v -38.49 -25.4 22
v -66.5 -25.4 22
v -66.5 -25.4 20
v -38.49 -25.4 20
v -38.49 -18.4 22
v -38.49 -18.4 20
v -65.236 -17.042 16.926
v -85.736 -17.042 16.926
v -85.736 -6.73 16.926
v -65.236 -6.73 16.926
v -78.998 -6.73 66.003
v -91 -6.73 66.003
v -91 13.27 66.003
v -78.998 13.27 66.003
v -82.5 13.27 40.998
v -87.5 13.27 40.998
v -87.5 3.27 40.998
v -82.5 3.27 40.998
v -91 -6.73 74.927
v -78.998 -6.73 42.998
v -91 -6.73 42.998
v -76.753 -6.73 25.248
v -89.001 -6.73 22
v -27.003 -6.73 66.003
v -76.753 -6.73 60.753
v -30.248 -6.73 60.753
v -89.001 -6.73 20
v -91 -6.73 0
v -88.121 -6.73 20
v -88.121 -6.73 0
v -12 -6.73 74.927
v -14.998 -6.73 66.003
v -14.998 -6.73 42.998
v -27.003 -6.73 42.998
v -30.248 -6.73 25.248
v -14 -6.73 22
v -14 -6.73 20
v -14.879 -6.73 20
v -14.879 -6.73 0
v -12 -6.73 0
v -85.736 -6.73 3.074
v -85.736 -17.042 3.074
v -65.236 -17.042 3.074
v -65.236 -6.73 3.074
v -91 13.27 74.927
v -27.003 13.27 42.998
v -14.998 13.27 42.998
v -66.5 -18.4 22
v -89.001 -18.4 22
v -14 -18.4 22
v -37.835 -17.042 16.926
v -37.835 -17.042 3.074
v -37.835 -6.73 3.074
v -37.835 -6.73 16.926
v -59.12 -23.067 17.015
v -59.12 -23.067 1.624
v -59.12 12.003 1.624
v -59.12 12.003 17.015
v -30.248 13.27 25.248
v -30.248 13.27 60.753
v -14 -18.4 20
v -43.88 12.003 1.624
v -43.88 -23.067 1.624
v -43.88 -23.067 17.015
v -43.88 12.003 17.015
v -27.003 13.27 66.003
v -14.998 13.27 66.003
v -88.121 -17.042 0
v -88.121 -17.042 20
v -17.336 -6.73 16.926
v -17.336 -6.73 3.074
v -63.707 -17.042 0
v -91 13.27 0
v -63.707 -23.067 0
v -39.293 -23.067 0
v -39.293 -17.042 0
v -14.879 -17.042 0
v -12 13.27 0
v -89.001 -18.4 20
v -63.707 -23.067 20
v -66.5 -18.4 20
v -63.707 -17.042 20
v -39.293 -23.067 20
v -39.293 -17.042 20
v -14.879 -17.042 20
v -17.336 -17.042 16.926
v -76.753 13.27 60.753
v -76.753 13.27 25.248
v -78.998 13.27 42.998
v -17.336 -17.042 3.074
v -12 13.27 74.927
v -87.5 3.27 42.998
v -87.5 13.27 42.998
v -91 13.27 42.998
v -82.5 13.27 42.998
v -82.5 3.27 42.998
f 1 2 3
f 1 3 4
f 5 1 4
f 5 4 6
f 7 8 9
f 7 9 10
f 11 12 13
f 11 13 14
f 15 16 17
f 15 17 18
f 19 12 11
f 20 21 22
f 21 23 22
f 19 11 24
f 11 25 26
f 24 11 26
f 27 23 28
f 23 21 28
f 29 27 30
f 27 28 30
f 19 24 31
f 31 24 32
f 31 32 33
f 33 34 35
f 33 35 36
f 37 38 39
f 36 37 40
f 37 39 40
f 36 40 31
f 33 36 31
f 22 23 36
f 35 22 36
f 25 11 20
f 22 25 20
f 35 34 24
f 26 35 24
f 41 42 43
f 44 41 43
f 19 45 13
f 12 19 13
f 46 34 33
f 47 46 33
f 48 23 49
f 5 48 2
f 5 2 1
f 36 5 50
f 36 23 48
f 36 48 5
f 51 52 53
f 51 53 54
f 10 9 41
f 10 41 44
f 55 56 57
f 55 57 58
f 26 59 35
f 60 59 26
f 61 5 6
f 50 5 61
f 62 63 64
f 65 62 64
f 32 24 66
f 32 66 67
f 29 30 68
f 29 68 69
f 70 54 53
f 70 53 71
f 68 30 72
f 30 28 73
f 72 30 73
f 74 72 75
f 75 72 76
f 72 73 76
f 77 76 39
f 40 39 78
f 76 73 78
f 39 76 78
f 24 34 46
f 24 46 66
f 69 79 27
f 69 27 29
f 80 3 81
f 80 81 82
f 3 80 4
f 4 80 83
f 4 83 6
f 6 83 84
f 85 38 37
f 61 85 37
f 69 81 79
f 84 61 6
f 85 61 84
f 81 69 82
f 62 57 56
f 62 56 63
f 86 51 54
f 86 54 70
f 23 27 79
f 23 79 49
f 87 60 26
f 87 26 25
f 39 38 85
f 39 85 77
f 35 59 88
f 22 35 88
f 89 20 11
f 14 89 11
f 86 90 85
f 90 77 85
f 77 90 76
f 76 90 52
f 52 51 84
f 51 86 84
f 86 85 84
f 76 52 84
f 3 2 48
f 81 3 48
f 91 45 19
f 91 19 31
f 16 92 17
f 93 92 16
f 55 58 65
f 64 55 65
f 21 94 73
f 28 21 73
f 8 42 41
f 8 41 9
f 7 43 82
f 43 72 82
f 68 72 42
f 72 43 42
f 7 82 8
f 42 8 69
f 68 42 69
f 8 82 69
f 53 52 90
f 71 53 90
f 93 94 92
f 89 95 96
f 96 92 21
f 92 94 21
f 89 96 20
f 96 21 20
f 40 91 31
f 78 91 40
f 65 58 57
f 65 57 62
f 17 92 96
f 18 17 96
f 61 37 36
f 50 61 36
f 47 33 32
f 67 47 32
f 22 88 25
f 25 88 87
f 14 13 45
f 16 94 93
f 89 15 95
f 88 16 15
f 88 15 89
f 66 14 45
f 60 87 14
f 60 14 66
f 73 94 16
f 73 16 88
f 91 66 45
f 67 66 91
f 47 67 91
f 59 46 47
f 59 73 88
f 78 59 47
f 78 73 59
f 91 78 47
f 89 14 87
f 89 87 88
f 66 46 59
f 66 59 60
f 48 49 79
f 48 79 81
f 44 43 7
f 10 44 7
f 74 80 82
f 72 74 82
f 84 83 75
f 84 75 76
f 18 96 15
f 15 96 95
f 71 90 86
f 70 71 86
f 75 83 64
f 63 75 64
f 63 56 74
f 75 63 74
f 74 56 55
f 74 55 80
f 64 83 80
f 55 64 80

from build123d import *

# Parameters (mm, degrees)
CROQUIS1_W              = 78.999998048
CROQUIS1_H              = 74.927002192
SALIENTE_EXTRUIR1_DEPTH = 20.000000019
SALIENTE_EXTRUIR2_DEPTH = 10.311999824
CROQUIS3_W              = 75.000999496
CROQUIS3_H              = 2.000000328
SALIENTE_EXTRUIR3_DEPTH = 8.357999846
CROQUIS4_W              = 24.49000068
CROQUIS4_H              = 6.999999285
CORTAR_EXTRUIR1_DEPTH   = 22.999999881
CROQUIS5_W              = 22.500999272
CROQUIS5_H              = 6.999999285
CORTAR_EXTRUIR2_DEPTH   = 22.999999881
CROQUIS6_W              = 12.001998722
CROQUIS6_H              = 23.004993797
CORTAR_EXTRUIR3_DEPTH   = 21.000000019
CROQUIS7_W              = 24.414002895
CROQUIS7_H              = 6.024999544
SALIENTE_EXTRUIR4_DEPTH = 19.999999553
CROQUIS8_W              = 46.50499858
CROQUIS8_H              = 35.505000502
CORTAR_EXTRUIR4_DEPTH   = 39.669999689
CROQUIS9_W              = 12.004999444
CROQUIS9_H              = 23.004993797
CORTAR_EXTRUIR5_DEPTH   = 21.000000019
CROQUIS10_W             = 15.239998699
CROQUIS10_H             = 15.390999034
CORTAR_EXTRUIR6_DEPTH   = 35.069999285
CROQUIS11_W             = 20.498998463
CROQUIS11_H             = 13.852000004
CORTAR_EXTRUIR7_DEPTH   = 10.311999824
CROQUIS12_W             = 20.499996841
CROQUIS12_H             = 13.852000004
CORTAR_EXTRUIR8_DEPTH   = 10.311999824
CROQUIS13_W             = 5
CROQUIS13_H             = 10
CORTAR_EXTRUIR9_DEPTH   = 2


with BuildPart() as part:
    # Croquis1 → Saliente-Extruir1 (new body)
    with BuildSketch(Plane(origin=(0, 13.269999996, 0), x_dir=(1, 0, 0), z_dir=(0, 1, 0))):
        with Locations((-51.499999128, -37.463501096)):
            Rectangle(CROQUIS1_W, CROQUIS1_H)
    extrude(amount=-SALIENTE_EXTRUIR1_DEPTH)

    # Croquis2 → Saliente-Extruir2 (add)
    with BuildSketch(Plane.XZ.offset(6.730000023)):
        Polygon((-14.878999442, 0), (-88.121004403, 0), (-88.121004403, 19.999999553), (-89.000999928, 19.999999553), (-89.000999928, 21.999999881), (-14.000000432, 21.999999881), (-14.000000432, 19.999999553), (-14.878999442, 19.999999553), align=None)
    extrude(amount=SALIENTE_EXTRUIR2_DEPTH)

    # Croquis3 → Saliente-Extruir3 (add)
    with BuildSketch(Plane.XZ.offset(17.041999847)):
        with Locations((-51.50050018, 20.999999717)):
            Rectangle(CROQUIS3_W, CROQUIS3_H)
    extrude(amount=SALIENTE_EXTRUIR3_DEPTH)

    # Croquis4 → Cortar-Extruir1 (cut, through all)
    with BuildSketch(Plane.XY.offset(21.999999881)):
        with Locations((-26.245000772, -21.900000051)):
            Rectangle(CROQUIS4_W, CROQUIS4_H)
    extrude(amount=-CORTAR_EXTRUIR1_DEPTH, mode=Mode.SUBTRACT)

    # Croquis5 → Cortar-Extruir2 (cut, through all)
    with BuildSketch(Plane.XY.offset(21.999999881)):
        with Locations((-77.750500292, -21.900000051)):
            Rectangle(CROQUIS5_W, CROQUIS5_H)
    extrude(amount=-CORTAR_EXTRUIR2_DEPTH, mode=Mode.SUBTRACT)

    # Croquis6 → Cortar-Extruir3 (cut, through all)
    with BuildSketch(Plane.XZ.offset(6.730000023)):
        with Locations((-84.998998791, 54.500497878)):
            Rectangle(CROQUIS6_W, CROQUIS6_H)
    extrude(amount=-CORTAR_EXTRUIR3_DEPTH, mode=Mode.SUBTRACT)

    # Croquis7 → Saliente-Extruir4 (add)
    with BuildSketch(Plane(origin=(0, 0, 19.999999553), x_dir=(-1, 0, 0), z_dir=(0, 0, -1))):
        with Locations((51.50000006, -20.054499619)):
            Rectangle(CROQUIS7_W, CROQUIS7_H)
    extrude(amount=SALIENTE_EXTRUIR4_DEPTH)

    # Croquis8 → Cortar-Extruir4 (cut, through all)
    with BuildSketch(Plane(origin=(0, 13.269999996, 0), x_dir=(-1, 0, 0), z_dir=(0, 1, 0))):
        with Locations((53.500498645, 43.000498787)):
            Rectangle(CROQUIS8_W, CROQUIS8_H)
    extrude(amount=-CORTAR_EXTRUIR4_DEPTH, mode=Mode.SUBTRACT)

    # Croquis9 → Cortar-Extruir5 (cut, through all)
    with BuildSketch(Plane.XZ.offset(6.730000023)):
        with Locations((-21.000499837, 54.500497878)):
            Rectangle(CROQUIS9_W, CROQUIS9_H)
    extrude(amount=-CORTAR_EXTRUIR5_DEPTH, mode=Mode.SUBTRACT)

    # Croquis10 → Cortar-Extruir6 (cut)
    with BuildSketch(Plane.XZ.offset(23.066999391)):
        with Locations((-51.50000006, 9.319499426)):
            Rectangle(CROQUIS10_W, CROQUIS10_H)
    extrude(amount=-CORTAR_EXTRUIR6_DEPTH, mode=Mode.SUBTRACT)

    # Croquis11 → Cortar-Extruir7 (cut)
    with BuildSketch(Plane.XZ.offset(17.041999847)):
        with Locations((-27.585498988, 9.999999893)):
            Rectangle(CROQUIS11_W, CROQUIS11_H)
    extrude(amount=-CORTAR_EXTRUIR7_DEPTH, mode=Mode.SUBTRACT)

    # Croquis12 → Cortar-Extruir8 (cut)
    with BuildSketch(Plane.XZ.offset(17.041999847)):
        with Locations((-75.486000628, 9.999999893)):
            Rectangle(CROQUIS12_W, CROQUIS12_H)
    extrude(amount=-CORTAR_EXTRUIR8_DEPTH, mode=Mode.SUBTRACT)

    # Croquis13 → Cortar-Extruir9 (cut)
    with BuildSketch(Plane.XY.offset(42.998000979)):
        with Locations((-84.999998152, 8.269999996)):
            Rectangle(CROQUIS13_W, CROQUIS13_H)
    extrude(amount=-CORTAR_EXTRUIR9_DEPTH, mode=Mode.SUBTRACT)


solid = part.part
